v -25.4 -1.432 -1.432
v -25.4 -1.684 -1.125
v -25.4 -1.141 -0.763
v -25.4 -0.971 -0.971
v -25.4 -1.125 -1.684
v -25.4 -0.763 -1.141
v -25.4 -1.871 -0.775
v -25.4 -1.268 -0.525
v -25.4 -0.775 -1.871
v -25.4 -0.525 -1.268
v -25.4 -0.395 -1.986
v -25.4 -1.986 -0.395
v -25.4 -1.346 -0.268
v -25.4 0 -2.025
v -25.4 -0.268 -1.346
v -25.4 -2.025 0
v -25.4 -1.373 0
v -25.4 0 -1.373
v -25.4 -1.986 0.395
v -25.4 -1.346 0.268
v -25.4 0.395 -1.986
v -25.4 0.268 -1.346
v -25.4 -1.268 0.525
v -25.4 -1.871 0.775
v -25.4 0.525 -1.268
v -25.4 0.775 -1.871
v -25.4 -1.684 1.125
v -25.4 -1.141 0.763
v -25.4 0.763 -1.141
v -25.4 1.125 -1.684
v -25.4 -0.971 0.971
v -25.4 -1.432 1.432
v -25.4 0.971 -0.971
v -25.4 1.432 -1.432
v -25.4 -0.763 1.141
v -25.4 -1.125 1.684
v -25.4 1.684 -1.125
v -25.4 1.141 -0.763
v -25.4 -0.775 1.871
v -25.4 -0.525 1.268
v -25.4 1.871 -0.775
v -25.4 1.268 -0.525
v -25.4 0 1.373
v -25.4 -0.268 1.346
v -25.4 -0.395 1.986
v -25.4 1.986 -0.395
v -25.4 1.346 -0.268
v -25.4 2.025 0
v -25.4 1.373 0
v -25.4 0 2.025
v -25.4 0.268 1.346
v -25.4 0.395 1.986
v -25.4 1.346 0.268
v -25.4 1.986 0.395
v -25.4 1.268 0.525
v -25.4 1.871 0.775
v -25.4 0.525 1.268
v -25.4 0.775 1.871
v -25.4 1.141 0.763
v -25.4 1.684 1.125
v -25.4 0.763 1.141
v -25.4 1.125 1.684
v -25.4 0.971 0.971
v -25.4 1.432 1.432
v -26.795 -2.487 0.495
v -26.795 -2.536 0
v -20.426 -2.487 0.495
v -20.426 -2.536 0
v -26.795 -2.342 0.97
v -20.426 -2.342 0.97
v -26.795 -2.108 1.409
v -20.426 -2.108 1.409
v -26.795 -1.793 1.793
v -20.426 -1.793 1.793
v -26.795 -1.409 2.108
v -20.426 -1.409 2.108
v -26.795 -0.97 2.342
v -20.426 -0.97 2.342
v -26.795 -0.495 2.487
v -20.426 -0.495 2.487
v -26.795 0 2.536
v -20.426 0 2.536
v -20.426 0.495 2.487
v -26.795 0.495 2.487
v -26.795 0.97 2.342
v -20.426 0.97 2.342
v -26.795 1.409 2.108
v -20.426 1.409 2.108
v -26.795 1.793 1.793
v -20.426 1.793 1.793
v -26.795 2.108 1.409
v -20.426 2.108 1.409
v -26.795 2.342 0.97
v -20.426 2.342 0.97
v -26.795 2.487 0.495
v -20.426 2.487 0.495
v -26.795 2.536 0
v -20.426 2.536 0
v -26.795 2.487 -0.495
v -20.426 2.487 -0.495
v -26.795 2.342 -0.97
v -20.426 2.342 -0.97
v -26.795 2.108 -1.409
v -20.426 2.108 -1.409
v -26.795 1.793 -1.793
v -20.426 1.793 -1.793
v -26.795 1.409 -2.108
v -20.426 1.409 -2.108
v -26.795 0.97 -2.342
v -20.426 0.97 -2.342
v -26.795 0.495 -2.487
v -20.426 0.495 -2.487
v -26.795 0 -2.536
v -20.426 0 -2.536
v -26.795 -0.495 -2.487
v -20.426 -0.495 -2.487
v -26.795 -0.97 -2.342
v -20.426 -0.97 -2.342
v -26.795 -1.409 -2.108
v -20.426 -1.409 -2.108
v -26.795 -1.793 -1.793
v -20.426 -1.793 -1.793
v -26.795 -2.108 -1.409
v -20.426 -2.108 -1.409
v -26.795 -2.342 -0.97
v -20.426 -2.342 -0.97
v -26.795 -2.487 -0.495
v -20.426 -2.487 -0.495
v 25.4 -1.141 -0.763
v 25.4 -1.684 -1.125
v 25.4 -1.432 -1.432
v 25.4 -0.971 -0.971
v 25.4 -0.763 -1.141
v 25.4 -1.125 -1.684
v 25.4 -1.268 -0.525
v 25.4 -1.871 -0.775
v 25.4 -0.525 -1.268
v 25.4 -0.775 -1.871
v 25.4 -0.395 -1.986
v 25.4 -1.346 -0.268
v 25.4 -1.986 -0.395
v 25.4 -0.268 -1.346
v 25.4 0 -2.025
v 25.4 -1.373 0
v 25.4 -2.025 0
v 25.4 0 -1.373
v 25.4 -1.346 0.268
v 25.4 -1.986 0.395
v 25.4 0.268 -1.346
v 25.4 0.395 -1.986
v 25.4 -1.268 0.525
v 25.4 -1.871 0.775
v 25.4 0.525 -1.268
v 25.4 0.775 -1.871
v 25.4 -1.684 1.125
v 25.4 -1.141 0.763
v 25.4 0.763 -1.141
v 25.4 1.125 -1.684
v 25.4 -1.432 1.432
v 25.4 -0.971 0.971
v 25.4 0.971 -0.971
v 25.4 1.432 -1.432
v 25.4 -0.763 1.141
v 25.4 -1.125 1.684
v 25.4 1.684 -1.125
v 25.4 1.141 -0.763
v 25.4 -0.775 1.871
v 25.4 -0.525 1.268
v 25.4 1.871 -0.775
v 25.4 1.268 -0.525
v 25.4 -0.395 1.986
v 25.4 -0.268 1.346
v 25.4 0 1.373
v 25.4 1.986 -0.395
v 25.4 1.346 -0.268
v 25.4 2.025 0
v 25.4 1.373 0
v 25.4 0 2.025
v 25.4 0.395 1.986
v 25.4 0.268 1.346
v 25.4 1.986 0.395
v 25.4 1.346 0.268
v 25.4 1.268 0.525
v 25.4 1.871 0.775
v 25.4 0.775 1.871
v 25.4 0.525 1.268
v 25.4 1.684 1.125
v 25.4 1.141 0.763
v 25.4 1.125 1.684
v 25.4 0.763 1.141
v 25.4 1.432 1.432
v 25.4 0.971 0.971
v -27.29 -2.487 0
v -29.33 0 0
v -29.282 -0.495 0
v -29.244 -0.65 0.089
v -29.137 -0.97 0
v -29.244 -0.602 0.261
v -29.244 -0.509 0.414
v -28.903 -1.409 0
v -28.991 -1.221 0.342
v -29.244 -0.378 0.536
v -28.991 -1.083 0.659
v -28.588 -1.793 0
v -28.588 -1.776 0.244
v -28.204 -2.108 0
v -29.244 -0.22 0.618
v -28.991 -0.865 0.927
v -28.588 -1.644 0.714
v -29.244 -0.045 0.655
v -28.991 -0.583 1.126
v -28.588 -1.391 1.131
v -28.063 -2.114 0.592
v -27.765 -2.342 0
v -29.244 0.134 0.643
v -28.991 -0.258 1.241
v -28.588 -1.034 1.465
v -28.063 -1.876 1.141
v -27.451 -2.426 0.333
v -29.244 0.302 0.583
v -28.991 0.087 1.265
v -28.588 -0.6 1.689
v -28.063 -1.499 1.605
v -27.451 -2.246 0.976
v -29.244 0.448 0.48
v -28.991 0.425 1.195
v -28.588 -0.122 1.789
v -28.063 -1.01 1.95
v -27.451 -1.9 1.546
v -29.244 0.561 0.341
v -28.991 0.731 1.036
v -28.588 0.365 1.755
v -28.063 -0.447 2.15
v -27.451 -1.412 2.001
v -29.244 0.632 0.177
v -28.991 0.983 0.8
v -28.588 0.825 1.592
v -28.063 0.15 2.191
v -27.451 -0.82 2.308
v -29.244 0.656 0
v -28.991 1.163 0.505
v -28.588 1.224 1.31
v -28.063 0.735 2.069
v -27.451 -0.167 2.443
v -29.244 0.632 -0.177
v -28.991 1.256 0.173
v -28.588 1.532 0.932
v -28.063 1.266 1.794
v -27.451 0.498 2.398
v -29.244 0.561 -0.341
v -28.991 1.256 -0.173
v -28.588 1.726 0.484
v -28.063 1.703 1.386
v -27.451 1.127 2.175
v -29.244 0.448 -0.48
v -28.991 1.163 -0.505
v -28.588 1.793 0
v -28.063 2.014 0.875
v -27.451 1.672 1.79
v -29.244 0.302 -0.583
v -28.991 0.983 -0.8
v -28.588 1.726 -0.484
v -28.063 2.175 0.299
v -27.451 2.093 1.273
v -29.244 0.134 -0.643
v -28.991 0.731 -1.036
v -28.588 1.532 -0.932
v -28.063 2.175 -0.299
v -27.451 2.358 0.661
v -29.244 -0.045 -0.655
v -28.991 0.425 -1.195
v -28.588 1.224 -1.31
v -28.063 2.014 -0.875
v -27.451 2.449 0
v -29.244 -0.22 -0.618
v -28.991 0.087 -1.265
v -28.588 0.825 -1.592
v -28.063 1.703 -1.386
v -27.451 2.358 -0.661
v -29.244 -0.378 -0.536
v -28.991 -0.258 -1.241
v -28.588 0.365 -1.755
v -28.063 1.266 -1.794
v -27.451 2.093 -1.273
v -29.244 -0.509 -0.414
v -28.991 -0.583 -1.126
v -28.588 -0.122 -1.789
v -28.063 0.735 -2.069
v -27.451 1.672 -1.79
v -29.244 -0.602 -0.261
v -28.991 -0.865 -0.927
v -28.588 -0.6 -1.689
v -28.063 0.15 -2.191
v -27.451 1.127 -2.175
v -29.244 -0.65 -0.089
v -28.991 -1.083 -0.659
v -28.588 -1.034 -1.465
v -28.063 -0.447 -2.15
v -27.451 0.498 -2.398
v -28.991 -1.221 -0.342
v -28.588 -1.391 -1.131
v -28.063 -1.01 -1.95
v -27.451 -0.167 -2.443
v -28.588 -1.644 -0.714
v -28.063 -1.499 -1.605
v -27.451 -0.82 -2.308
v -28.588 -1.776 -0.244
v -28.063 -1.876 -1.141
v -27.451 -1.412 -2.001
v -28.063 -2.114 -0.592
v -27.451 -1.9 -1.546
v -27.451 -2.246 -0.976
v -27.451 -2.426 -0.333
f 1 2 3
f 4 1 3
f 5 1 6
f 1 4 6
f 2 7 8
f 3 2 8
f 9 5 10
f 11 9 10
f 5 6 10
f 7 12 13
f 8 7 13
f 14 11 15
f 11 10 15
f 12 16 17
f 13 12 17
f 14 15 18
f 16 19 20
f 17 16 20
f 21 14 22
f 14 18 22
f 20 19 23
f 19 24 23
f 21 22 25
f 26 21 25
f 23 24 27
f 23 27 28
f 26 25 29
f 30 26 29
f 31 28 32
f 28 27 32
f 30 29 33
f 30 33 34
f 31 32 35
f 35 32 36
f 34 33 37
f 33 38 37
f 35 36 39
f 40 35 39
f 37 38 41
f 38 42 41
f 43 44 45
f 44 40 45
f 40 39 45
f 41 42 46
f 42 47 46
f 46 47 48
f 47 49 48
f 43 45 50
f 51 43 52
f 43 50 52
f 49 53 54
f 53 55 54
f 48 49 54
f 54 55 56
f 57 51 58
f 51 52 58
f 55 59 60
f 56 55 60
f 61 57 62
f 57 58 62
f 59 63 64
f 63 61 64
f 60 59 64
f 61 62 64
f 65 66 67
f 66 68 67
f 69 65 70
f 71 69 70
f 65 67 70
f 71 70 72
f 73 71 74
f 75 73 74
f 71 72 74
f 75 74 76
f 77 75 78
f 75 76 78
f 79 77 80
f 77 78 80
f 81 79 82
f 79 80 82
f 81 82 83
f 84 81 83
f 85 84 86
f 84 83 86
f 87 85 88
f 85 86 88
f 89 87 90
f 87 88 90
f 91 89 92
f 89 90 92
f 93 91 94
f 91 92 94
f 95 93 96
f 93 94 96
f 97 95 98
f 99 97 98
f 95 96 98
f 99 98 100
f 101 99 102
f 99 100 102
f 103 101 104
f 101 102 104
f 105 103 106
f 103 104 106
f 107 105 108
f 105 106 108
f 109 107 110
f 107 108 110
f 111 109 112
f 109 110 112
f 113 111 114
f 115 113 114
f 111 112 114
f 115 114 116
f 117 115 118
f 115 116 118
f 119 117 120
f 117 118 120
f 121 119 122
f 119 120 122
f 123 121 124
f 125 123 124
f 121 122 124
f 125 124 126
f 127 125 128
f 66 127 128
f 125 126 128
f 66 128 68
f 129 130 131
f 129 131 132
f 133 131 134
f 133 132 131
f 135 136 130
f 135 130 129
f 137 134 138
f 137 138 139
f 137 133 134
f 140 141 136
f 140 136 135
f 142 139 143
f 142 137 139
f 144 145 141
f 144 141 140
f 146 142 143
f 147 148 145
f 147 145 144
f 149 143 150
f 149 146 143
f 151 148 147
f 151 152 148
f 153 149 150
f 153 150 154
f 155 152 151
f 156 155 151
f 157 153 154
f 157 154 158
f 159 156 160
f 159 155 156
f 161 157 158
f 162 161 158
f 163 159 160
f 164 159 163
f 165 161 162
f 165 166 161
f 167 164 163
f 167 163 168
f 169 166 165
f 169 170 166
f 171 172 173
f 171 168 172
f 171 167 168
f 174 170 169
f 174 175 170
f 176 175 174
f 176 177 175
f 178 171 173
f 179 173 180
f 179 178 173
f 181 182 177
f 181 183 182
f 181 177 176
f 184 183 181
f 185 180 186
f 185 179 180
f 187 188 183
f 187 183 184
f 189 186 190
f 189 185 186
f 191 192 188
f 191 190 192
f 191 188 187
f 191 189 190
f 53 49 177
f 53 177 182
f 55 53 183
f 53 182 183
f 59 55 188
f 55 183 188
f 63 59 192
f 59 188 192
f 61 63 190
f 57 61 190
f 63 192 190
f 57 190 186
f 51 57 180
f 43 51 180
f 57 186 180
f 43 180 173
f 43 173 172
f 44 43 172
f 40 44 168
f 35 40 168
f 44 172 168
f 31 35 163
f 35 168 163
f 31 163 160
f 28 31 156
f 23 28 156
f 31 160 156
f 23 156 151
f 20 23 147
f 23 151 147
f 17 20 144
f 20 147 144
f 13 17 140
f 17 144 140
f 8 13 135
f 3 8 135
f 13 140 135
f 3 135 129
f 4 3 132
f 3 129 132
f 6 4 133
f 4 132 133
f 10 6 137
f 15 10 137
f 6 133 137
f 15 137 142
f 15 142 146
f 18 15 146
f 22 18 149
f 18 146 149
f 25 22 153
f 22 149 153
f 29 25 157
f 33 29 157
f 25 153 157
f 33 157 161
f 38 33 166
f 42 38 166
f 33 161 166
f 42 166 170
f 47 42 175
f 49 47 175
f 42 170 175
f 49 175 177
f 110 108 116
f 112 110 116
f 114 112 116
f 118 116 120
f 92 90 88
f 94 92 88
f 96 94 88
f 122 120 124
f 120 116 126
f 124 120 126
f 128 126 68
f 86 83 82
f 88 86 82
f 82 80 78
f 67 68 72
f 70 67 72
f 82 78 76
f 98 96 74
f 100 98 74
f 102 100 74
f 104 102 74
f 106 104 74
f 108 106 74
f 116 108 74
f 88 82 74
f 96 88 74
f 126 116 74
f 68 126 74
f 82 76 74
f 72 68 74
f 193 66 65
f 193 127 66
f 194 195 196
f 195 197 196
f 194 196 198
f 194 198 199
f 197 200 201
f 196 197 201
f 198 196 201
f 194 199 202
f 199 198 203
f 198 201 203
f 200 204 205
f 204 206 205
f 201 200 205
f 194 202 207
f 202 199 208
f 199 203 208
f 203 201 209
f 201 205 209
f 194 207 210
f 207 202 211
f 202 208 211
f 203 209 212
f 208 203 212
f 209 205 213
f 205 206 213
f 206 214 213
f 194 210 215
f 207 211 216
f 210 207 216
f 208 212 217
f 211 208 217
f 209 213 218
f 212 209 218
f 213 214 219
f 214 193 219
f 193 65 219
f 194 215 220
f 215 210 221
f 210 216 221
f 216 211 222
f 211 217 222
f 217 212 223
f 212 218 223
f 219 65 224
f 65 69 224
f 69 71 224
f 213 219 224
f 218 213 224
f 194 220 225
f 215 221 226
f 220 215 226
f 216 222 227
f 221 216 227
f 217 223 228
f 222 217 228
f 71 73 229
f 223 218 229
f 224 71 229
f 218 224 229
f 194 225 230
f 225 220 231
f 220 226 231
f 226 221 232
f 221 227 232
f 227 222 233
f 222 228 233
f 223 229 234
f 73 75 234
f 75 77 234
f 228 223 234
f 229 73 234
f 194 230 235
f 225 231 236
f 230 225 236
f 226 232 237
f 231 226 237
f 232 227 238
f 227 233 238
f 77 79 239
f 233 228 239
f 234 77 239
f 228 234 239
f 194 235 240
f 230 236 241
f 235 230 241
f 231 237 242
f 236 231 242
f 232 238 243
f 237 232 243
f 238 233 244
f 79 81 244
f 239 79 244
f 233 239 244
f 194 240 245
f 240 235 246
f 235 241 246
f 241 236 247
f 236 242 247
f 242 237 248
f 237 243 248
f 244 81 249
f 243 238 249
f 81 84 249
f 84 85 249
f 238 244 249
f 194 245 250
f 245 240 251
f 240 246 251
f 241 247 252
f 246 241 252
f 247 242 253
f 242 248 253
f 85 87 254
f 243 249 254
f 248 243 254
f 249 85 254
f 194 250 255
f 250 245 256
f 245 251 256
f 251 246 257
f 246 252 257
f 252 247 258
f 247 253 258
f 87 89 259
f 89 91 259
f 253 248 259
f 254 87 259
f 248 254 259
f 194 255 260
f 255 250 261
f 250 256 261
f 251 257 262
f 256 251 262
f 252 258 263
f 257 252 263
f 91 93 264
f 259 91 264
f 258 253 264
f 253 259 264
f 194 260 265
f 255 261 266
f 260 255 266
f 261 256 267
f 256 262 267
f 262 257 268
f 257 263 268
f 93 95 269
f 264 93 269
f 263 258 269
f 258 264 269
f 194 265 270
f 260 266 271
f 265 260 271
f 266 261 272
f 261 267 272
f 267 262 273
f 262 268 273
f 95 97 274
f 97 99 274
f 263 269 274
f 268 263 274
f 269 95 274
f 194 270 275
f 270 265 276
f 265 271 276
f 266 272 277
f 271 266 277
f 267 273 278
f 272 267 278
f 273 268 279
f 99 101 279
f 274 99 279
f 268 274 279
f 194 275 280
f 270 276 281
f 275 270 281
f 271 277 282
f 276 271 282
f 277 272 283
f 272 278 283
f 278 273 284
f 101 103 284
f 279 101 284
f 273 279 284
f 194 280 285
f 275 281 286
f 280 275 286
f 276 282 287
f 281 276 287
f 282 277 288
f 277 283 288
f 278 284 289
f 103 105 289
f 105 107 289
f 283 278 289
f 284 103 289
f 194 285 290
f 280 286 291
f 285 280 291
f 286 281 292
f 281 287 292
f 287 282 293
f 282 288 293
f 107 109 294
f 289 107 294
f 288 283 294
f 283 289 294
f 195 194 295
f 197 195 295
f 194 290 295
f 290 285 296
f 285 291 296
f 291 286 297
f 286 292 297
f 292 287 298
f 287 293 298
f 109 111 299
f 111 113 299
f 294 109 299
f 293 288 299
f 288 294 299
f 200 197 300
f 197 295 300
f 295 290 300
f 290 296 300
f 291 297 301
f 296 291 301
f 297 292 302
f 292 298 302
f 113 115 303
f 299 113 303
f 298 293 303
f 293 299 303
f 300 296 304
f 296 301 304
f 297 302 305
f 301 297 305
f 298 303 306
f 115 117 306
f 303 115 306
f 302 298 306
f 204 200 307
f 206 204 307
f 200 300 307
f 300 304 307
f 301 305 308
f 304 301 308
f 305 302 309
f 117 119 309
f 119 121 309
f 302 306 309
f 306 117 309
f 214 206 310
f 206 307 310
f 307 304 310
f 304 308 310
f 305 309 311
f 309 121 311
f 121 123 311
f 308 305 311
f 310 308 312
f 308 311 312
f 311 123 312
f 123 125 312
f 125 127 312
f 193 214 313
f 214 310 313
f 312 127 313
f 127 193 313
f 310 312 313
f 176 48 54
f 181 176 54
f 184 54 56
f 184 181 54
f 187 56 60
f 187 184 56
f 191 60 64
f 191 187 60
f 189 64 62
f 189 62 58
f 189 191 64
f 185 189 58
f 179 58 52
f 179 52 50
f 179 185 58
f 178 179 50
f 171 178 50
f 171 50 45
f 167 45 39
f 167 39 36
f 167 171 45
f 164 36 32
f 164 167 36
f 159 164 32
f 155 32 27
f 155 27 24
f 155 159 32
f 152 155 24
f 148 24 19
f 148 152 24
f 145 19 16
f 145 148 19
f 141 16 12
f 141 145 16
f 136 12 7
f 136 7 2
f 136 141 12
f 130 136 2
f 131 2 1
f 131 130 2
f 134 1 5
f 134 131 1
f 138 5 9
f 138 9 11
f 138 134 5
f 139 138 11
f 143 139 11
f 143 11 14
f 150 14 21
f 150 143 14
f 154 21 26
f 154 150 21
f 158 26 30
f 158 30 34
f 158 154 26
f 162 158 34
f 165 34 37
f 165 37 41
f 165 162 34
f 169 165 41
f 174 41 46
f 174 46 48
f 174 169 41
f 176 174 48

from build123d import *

# Parameters (mm, degrees)
F0_R     = 2.0250297423
F1_DEPTH = 25.4
F2_R     = 1.3726360735
F3_DEPTH = 25.4


with BuildPart() as f1:
    # F0 (on Right) → F1 (new body, symmetric)
    with BuildSketch(Plane.YZ):
        Circle(F0_R)
    extrude(amount=F1_DEPTH, both=True)

    # F2 (on Right) → F3 (cut, symmetric)
    with BuildSketch(Plane.YZ):
        Circle(F2_R)
    extrude(amount=F3_DEPTH, both=True, mode=Mode.SUBTRACT)


with BuildPart() as f5:
    # F4 (on Top) → F5 (revolve)
    with BuildSketch(Plane.XY):
        with BuildLine():
            Line((-20.4256717116, -2.5355029557), (-20.4256717116, 0))
            Line((-20.4256717116, 0), (-29.3303910349, 0))
            ThreePointArc((-29.3303910349, 0), (-28.5877594129, -1.7928713337), (-26.7948880792, -2.5355029557))
            Line((-26.7948880792, -2.5355029557), (-20.4256717116, -2.5355029557))
        make_face()
    revolve(axis=Axis((-14.6651955174, 0, 0), (-1, 0, 0)))


solid = Compound([f1.part, f5.part])
